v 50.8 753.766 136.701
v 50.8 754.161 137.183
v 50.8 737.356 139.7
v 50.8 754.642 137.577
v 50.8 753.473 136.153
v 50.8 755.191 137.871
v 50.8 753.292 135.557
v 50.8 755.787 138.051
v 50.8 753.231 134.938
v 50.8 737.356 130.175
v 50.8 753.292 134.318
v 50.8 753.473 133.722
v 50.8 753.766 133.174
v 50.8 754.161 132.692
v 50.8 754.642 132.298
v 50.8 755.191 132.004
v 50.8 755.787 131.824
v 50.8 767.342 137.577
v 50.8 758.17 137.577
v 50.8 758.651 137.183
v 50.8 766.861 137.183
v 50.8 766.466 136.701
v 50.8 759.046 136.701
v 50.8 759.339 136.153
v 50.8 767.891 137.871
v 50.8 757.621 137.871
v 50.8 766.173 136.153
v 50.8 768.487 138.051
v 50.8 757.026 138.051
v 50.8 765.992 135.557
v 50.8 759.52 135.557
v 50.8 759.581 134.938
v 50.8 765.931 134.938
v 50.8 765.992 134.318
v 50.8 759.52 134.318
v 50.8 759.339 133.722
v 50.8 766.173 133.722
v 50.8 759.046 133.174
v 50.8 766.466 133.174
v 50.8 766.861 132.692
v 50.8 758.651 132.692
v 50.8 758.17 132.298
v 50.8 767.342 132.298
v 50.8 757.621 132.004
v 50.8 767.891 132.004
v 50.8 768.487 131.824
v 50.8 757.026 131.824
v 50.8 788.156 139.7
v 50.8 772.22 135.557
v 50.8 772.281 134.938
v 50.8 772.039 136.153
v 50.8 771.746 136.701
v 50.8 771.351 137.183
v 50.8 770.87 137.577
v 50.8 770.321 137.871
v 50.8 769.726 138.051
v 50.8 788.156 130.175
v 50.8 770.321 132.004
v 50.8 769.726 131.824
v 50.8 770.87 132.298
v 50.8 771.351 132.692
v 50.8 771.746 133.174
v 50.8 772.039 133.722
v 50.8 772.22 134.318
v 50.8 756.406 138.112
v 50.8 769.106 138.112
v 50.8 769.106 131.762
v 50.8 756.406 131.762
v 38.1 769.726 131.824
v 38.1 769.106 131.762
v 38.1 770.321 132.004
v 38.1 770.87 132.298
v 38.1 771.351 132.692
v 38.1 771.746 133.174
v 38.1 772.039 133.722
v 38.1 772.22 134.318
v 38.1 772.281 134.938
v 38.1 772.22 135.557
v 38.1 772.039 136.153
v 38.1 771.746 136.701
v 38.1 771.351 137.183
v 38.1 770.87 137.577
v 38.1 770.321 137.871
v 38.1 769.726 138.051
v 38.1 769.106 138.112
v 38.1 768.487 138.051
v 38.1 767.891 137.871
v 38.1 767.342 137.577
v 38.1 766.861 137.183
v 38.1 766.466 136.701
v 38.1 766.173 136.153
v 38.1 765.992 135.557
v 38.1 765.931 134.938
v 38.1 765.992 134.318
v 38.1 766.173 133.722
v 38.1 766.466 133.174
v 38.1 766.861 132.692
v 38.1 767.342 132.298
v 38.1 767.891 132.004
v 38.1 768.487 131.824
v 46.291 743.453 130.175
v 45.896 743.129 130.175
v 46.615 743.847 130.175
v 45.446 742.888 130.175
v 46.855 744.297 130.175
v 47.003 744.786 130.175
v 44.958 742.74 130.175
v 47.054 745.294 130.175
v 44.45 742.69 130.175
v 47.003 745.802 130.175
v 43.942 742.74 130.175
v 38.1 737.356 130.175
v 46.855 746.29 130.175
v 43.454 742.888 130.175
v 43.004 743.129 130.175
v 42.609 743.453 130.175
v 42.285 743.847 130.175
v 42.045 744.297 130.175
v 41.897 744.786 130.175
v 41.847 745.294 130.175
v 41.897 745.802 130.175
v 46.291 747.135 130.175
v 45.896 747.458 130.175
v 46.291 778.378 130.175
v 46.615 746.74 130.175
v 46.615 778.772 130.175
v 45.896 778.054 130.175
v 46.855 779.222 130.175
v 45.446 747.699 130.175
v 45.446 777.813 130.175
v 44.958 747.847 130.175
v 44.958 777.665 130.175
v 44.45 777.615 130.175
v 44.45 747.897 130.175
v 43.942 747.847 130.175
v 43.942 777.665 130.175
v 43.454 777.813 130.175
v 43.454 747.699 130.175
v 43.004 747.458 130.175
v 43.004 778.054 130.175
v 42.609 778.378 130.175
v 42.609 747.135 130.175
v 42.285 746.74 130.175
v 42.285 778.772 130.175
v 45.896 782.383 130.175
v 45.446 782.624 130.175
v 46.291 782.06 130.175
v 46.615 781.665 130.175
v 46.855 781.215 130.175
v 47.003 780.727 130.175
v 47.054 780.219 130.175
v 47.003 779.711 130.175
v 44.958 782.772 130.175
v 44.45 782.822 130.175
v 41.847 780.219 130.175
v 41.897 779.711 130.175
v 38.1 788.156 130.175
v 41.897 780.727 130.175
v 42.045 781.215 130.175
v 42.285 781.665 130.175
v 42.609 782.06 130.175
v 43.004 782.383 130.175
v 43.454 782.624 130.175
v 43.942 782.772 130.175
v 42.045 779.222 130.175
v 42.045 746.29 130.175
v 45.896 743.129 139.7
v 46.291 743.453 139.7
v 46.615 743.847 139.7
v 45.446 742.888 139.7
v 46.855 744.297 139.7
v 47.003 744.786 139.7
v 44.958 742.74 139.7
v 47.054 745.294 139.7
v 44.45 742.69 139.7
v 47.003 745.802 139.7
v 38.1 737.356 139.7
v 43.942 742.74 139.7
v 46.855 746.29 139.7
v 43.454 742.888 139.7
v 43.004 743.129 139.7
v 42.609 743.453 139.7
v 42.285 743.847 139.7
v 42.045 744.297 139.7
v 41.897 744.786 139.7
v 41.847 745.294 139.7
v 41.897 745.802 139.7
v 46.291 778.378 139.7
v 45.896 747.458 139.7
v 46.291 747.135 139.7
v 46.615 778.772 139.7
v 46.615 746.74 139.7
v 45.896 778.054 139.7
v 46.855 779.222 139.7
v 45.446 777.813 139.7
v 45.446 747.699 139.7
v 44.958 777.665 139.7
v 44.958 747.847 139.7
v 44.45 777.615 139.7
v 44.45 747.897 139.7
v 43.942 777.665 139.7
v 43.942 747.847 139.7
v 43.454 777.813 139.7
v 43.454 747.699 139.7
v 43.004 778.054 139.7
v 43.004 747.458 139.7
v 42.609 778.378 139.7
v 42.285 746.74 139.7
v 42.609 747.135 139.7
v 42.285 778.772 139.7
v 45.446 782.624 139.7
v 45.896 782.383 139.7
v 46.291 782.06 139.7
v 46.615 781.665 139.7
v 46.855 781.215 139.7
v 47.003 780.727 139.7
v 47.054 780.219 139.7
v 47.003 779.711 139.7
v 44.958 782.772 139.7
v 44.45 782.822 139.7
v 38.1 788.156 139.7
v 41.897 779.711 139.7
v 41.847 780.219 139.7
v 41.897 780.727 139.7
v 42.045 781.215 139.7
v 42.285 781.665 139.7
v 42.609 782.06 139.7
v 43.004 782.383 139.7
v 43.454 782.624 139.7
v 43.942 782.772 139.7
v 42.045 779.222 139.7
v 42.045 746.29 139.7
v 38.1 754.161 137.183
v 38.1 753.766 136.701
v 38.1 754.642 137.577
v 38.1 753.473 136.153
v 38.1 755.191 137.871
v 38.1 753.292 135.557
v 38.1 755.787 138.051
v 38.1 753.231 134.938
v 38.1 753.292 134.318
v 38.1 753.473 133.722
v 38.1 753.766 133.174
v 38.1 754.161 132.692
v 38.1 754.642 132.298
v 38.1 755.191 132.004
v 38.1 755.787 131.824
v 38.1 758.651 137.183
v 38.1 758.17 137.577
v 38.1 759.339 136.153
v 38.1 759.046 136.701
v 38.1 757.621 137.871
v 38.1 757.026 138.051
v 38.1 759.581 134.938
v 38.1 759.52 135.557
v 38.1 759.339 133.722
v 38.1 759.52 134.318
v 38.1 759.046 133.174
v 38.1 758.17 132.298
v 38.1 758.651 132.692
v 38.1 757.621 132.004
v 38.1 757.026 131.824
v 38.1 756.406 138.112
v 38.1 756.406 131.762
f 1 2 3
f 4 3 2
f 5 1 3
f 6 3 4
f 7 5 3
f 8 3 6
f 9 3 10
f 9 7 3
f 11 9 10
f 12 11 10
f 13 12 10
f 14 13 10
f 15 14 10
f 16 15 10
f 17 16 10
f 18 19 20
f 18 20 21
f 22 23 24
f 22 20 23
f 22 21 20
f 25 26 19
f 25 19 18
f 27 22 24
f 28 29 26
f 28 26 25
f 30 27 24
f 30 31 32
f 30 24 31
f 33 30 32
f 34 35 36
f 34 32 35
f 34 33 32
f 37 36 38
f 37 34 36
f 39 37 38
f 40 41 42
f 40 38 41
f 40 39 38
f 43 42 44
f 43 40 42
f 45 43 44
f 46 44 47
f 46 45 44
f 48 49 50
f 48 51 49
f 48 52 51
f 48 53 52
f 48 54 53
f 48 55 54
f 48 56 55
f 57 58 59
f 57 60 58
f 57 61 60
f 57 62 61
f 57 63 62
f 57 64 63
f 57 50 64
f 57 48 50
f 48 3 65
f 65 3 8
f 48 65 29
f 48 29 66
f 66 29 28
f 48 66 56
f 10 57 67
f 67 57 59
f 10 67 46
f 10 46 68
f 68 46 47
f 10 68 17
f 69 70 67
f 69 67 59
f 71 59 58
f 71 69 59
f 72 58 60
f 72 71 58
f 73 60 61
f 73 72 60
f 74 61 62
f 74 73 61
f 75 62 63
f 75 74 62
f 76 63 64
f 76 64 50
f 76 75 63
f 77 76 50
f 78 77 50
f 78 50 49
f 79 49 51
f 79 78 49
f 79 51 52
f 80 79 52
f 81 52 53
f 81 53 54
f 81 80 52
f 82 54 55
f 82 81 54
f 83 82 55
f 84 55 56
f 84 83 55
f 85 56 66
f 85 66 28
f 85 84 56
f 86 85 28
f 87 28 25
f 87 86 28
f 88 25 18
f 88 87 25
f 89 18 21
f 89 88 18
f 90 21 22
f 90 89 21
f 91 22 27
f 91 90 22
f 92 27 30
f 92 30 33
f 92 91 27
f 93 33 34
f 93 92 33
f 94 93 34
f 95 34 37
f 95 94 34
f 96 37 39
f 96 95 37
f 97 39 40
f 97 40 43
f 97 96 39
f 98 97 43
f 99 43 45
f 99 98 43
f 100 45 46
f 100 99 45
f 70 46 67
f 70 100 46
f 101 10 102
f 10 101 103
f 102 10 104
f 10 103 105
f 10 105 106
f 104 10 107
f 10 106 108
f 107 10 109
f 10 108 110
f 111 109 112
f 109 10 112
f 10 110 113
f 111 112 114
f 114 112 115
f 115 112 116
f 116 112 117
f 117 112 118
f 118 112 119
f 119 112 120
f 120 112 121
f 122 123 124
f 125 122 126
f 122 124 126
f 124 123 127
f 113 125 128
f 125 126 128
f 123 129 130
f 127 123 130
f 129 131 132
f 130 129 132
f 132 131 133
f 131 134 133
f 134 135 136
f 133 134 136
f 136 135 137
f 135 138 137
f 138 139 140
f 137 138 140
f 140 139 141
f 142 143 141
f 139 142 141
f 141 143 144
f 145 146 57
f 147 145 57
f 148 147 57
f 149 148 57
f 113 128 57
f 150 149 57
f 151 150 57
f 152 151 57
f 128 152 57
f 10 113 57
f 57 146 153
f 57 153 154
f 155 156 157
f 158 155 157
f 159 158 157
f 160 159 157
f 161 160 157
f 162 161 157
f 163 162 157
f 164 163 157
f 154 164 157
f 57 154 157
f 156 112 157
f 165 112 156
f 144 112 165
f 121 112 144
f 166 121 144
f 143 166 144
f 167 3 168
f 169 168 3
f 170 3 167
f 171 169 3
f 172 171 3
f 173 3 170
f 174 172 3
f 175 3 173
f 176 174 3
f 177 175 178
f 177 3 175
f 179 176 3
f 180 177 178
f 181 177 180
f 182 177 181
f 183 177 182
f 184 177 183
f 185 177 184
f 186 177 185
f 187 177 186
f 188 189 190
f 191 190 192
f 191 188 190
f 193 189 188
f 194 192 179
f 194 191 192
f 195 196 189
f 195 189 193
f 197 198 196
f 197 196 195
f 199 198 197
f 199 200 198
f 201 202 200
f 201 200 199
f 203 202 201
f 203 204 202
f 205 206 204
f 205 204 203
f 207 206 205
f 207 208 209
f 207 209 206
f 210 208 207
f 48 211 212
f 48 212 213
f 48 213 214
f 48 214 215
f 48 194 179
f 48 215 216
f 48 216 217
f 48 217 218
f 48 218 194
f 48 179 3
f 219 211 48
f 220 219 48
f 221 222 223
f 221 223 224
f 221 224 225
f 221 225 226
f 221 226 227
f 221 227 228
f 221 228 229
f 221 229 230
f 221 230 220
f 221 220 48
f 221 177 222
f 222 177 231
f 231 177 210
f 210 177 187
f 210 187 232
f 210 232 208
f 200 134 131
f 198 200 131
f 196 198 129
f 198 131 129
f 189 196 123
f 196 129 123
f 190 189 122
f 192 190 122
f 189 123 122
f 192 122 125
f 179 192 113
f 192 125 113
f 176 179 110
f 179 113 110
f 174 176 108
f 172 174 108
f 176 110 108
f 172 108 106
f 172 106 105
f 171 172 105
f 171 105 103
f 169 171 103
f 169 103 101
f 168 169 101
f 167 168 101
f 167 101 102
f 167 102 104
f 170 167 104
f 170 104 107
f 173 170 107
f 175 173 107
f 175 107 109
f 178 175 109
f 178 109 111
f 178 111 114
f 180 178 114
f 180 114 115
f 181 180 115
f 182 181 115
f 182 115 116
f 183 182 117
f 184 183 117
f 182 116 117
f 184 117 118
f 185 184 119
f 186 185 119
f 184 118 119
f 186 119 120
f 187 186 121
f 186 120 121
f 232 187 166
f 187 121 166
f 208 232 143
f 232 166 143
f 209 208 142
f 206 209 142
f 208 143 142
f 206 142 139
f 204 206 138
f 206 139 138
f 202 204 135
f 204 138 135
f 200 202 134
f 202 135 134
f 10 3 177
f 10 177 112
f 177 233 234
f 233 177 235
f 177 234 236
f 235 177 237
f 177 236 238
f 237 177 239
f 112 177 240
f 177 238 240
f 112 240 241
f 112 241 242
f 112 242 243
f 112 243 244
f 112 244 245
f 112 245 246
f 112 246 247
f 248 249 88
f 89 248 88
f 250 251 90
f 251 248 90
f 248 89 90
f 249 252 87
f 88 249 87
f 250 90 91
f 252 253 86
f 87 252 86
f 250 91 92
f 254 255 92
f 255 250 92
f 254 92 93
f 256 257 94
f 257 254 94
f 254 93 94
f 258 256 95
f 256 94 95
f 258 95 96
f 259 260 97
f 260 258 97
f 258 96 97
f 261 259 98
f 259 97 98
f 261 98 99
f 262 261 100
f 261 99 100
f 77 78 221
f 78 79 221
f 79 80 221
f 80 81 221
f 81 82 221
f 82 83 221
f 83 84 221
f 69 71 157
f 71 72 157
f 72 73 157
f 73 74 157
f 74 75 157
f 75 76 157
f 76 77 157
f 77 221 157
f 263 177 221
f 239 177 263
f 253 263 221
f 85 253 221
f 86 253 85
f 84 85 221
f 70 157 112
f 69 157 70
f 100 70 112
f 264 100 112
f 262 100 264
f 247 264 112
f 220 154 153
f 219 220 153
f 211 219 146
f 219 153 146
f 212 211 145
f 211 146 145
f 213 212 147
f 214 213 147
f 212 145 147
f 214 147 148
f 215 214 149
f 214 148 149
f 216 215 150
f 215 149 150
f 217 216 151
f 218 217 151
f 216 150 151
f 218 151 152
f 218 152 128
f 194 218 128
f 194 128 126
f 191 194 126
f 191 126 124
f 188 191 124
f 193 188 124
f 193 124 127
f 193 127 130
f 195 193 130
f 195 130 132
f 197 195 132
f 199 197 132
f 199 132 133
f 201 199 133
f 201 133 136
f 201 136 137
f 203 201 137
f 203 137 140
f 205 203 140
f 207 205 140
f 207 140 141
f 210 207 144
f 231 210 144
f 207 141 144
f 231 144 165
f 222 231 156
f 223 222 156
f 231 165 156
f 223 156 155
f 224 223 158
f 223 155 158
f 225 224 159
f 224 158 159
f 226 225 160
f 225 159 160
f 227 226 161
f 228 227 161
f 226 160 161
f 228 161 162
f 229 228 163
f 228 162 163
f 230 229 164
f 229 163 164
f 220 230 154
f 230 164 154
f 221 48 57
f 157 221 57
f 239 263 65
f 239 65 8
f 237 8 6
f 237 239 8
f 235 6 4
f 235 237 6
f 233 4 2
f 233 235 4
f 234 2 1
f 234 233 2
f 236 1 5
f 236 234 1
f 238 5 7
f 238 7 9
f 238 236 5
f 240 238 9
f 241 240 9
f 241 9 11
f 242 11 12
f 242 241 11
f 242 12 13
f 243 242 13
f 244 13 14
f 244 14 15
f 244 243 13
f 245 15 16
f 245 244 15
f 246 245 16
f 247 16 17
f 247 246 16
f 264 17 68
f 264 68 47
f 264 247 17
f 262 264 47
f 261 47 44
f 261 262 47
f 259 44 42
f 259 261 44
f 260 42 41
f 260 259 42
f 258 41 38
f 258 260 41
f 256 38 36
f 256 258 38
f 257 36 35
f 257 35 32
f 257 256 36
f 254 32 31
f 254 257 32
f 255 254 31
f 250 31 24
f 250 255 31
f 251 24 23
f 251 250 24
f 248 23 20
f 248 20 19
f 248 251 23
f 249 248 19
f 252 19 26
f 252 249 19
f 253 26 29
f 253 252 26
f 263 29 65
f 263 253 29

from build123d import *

# Parameters (mm, degrees)
SKETCH1_W           = 9.525
SKETCH1_H           = 50.8
SKETCH1_R           = 3.175
BOSS_EXTRUDE1_DEPTH = 12.7
CUT_EXTRUDE1_REACH  = 791.849
SKETCH2_R           = 2.6035


with BuildPart() as part:
    # Sketch1 → Boss-Extrude1 (new body)
    with BuildSketch(Plane(origin=(38.1, 0, 0), x_dir=(0, 0, -1), z_dir=(1, 0, 0))):
        with Locations((-134.9375, 762.756140976)):
            Rectangle(SKETCH1_W, SKETCH1_H)
        with Locations((-134.9375, 769.106140976)):
            Circle(SKETCH1_R, mode=Mode.SUBTRACT)
        with Locations(Location((-134.9375, 756.406140976, 0), (0, 0, 180))):
            Circle(SKETCH1_R, mode=Mode.SUBTRACT)
    extrude(amount=BOSS_EXTRUDE1_DEPTH)

    # Sketch2 → Cut-Extrude1 (cut, up to next)
    with BuildSketch(Plane(origin=(0, 0, 130.175), x_dir=(-1, 0, 0), z_dir=(0, 0, -1)), mode=Mode.PRIVATE) as cut_extrude1_sk1:
        with Locations(Location((-44.45, 780.218640976, 0), (0, 0, 90))):
            Circle(SKETCH2_R)
    cut_extrude1_tool1 = extrude(cut_extrude1_sk1.sketch, amount=-CUT_EXTRUDE1_REACH, mode=Mode.PRIVATE) & part.part
    # Sketch2 → Cut-Extrude1 (cut, up to next)
    with BuildSketch(Plane(origin=(0, 0, 130.175), x_dir=(-1, 0, 0), z_dir=(0, 0, -1)), mode=Mode.PRIVATE) as cut_extrude1_sk2:
        with Locations(Location((-44.45, 745.293640976, 0), (0, 0, 90))):
            Circle(SKETCH2_R)
    cut_extrude1_tool2 = extrude(cut_extrude1_sk2.sketch, amount=-CUT_EXTRUDE1_REACH, mode=Mode.PRIVATE) & part.part
    add(cut_extrude1_tool1.solids().sort_by_distance((44.45, 780.218641, 130.175))[0], mode=Mode.SUBTRACT)
    add(cut_extrude1_tool2.solids().sort_by_distance((44.45, 745.293641, 130.175))[0], mode=Mode.SUBTRACT)


solid = part.part
